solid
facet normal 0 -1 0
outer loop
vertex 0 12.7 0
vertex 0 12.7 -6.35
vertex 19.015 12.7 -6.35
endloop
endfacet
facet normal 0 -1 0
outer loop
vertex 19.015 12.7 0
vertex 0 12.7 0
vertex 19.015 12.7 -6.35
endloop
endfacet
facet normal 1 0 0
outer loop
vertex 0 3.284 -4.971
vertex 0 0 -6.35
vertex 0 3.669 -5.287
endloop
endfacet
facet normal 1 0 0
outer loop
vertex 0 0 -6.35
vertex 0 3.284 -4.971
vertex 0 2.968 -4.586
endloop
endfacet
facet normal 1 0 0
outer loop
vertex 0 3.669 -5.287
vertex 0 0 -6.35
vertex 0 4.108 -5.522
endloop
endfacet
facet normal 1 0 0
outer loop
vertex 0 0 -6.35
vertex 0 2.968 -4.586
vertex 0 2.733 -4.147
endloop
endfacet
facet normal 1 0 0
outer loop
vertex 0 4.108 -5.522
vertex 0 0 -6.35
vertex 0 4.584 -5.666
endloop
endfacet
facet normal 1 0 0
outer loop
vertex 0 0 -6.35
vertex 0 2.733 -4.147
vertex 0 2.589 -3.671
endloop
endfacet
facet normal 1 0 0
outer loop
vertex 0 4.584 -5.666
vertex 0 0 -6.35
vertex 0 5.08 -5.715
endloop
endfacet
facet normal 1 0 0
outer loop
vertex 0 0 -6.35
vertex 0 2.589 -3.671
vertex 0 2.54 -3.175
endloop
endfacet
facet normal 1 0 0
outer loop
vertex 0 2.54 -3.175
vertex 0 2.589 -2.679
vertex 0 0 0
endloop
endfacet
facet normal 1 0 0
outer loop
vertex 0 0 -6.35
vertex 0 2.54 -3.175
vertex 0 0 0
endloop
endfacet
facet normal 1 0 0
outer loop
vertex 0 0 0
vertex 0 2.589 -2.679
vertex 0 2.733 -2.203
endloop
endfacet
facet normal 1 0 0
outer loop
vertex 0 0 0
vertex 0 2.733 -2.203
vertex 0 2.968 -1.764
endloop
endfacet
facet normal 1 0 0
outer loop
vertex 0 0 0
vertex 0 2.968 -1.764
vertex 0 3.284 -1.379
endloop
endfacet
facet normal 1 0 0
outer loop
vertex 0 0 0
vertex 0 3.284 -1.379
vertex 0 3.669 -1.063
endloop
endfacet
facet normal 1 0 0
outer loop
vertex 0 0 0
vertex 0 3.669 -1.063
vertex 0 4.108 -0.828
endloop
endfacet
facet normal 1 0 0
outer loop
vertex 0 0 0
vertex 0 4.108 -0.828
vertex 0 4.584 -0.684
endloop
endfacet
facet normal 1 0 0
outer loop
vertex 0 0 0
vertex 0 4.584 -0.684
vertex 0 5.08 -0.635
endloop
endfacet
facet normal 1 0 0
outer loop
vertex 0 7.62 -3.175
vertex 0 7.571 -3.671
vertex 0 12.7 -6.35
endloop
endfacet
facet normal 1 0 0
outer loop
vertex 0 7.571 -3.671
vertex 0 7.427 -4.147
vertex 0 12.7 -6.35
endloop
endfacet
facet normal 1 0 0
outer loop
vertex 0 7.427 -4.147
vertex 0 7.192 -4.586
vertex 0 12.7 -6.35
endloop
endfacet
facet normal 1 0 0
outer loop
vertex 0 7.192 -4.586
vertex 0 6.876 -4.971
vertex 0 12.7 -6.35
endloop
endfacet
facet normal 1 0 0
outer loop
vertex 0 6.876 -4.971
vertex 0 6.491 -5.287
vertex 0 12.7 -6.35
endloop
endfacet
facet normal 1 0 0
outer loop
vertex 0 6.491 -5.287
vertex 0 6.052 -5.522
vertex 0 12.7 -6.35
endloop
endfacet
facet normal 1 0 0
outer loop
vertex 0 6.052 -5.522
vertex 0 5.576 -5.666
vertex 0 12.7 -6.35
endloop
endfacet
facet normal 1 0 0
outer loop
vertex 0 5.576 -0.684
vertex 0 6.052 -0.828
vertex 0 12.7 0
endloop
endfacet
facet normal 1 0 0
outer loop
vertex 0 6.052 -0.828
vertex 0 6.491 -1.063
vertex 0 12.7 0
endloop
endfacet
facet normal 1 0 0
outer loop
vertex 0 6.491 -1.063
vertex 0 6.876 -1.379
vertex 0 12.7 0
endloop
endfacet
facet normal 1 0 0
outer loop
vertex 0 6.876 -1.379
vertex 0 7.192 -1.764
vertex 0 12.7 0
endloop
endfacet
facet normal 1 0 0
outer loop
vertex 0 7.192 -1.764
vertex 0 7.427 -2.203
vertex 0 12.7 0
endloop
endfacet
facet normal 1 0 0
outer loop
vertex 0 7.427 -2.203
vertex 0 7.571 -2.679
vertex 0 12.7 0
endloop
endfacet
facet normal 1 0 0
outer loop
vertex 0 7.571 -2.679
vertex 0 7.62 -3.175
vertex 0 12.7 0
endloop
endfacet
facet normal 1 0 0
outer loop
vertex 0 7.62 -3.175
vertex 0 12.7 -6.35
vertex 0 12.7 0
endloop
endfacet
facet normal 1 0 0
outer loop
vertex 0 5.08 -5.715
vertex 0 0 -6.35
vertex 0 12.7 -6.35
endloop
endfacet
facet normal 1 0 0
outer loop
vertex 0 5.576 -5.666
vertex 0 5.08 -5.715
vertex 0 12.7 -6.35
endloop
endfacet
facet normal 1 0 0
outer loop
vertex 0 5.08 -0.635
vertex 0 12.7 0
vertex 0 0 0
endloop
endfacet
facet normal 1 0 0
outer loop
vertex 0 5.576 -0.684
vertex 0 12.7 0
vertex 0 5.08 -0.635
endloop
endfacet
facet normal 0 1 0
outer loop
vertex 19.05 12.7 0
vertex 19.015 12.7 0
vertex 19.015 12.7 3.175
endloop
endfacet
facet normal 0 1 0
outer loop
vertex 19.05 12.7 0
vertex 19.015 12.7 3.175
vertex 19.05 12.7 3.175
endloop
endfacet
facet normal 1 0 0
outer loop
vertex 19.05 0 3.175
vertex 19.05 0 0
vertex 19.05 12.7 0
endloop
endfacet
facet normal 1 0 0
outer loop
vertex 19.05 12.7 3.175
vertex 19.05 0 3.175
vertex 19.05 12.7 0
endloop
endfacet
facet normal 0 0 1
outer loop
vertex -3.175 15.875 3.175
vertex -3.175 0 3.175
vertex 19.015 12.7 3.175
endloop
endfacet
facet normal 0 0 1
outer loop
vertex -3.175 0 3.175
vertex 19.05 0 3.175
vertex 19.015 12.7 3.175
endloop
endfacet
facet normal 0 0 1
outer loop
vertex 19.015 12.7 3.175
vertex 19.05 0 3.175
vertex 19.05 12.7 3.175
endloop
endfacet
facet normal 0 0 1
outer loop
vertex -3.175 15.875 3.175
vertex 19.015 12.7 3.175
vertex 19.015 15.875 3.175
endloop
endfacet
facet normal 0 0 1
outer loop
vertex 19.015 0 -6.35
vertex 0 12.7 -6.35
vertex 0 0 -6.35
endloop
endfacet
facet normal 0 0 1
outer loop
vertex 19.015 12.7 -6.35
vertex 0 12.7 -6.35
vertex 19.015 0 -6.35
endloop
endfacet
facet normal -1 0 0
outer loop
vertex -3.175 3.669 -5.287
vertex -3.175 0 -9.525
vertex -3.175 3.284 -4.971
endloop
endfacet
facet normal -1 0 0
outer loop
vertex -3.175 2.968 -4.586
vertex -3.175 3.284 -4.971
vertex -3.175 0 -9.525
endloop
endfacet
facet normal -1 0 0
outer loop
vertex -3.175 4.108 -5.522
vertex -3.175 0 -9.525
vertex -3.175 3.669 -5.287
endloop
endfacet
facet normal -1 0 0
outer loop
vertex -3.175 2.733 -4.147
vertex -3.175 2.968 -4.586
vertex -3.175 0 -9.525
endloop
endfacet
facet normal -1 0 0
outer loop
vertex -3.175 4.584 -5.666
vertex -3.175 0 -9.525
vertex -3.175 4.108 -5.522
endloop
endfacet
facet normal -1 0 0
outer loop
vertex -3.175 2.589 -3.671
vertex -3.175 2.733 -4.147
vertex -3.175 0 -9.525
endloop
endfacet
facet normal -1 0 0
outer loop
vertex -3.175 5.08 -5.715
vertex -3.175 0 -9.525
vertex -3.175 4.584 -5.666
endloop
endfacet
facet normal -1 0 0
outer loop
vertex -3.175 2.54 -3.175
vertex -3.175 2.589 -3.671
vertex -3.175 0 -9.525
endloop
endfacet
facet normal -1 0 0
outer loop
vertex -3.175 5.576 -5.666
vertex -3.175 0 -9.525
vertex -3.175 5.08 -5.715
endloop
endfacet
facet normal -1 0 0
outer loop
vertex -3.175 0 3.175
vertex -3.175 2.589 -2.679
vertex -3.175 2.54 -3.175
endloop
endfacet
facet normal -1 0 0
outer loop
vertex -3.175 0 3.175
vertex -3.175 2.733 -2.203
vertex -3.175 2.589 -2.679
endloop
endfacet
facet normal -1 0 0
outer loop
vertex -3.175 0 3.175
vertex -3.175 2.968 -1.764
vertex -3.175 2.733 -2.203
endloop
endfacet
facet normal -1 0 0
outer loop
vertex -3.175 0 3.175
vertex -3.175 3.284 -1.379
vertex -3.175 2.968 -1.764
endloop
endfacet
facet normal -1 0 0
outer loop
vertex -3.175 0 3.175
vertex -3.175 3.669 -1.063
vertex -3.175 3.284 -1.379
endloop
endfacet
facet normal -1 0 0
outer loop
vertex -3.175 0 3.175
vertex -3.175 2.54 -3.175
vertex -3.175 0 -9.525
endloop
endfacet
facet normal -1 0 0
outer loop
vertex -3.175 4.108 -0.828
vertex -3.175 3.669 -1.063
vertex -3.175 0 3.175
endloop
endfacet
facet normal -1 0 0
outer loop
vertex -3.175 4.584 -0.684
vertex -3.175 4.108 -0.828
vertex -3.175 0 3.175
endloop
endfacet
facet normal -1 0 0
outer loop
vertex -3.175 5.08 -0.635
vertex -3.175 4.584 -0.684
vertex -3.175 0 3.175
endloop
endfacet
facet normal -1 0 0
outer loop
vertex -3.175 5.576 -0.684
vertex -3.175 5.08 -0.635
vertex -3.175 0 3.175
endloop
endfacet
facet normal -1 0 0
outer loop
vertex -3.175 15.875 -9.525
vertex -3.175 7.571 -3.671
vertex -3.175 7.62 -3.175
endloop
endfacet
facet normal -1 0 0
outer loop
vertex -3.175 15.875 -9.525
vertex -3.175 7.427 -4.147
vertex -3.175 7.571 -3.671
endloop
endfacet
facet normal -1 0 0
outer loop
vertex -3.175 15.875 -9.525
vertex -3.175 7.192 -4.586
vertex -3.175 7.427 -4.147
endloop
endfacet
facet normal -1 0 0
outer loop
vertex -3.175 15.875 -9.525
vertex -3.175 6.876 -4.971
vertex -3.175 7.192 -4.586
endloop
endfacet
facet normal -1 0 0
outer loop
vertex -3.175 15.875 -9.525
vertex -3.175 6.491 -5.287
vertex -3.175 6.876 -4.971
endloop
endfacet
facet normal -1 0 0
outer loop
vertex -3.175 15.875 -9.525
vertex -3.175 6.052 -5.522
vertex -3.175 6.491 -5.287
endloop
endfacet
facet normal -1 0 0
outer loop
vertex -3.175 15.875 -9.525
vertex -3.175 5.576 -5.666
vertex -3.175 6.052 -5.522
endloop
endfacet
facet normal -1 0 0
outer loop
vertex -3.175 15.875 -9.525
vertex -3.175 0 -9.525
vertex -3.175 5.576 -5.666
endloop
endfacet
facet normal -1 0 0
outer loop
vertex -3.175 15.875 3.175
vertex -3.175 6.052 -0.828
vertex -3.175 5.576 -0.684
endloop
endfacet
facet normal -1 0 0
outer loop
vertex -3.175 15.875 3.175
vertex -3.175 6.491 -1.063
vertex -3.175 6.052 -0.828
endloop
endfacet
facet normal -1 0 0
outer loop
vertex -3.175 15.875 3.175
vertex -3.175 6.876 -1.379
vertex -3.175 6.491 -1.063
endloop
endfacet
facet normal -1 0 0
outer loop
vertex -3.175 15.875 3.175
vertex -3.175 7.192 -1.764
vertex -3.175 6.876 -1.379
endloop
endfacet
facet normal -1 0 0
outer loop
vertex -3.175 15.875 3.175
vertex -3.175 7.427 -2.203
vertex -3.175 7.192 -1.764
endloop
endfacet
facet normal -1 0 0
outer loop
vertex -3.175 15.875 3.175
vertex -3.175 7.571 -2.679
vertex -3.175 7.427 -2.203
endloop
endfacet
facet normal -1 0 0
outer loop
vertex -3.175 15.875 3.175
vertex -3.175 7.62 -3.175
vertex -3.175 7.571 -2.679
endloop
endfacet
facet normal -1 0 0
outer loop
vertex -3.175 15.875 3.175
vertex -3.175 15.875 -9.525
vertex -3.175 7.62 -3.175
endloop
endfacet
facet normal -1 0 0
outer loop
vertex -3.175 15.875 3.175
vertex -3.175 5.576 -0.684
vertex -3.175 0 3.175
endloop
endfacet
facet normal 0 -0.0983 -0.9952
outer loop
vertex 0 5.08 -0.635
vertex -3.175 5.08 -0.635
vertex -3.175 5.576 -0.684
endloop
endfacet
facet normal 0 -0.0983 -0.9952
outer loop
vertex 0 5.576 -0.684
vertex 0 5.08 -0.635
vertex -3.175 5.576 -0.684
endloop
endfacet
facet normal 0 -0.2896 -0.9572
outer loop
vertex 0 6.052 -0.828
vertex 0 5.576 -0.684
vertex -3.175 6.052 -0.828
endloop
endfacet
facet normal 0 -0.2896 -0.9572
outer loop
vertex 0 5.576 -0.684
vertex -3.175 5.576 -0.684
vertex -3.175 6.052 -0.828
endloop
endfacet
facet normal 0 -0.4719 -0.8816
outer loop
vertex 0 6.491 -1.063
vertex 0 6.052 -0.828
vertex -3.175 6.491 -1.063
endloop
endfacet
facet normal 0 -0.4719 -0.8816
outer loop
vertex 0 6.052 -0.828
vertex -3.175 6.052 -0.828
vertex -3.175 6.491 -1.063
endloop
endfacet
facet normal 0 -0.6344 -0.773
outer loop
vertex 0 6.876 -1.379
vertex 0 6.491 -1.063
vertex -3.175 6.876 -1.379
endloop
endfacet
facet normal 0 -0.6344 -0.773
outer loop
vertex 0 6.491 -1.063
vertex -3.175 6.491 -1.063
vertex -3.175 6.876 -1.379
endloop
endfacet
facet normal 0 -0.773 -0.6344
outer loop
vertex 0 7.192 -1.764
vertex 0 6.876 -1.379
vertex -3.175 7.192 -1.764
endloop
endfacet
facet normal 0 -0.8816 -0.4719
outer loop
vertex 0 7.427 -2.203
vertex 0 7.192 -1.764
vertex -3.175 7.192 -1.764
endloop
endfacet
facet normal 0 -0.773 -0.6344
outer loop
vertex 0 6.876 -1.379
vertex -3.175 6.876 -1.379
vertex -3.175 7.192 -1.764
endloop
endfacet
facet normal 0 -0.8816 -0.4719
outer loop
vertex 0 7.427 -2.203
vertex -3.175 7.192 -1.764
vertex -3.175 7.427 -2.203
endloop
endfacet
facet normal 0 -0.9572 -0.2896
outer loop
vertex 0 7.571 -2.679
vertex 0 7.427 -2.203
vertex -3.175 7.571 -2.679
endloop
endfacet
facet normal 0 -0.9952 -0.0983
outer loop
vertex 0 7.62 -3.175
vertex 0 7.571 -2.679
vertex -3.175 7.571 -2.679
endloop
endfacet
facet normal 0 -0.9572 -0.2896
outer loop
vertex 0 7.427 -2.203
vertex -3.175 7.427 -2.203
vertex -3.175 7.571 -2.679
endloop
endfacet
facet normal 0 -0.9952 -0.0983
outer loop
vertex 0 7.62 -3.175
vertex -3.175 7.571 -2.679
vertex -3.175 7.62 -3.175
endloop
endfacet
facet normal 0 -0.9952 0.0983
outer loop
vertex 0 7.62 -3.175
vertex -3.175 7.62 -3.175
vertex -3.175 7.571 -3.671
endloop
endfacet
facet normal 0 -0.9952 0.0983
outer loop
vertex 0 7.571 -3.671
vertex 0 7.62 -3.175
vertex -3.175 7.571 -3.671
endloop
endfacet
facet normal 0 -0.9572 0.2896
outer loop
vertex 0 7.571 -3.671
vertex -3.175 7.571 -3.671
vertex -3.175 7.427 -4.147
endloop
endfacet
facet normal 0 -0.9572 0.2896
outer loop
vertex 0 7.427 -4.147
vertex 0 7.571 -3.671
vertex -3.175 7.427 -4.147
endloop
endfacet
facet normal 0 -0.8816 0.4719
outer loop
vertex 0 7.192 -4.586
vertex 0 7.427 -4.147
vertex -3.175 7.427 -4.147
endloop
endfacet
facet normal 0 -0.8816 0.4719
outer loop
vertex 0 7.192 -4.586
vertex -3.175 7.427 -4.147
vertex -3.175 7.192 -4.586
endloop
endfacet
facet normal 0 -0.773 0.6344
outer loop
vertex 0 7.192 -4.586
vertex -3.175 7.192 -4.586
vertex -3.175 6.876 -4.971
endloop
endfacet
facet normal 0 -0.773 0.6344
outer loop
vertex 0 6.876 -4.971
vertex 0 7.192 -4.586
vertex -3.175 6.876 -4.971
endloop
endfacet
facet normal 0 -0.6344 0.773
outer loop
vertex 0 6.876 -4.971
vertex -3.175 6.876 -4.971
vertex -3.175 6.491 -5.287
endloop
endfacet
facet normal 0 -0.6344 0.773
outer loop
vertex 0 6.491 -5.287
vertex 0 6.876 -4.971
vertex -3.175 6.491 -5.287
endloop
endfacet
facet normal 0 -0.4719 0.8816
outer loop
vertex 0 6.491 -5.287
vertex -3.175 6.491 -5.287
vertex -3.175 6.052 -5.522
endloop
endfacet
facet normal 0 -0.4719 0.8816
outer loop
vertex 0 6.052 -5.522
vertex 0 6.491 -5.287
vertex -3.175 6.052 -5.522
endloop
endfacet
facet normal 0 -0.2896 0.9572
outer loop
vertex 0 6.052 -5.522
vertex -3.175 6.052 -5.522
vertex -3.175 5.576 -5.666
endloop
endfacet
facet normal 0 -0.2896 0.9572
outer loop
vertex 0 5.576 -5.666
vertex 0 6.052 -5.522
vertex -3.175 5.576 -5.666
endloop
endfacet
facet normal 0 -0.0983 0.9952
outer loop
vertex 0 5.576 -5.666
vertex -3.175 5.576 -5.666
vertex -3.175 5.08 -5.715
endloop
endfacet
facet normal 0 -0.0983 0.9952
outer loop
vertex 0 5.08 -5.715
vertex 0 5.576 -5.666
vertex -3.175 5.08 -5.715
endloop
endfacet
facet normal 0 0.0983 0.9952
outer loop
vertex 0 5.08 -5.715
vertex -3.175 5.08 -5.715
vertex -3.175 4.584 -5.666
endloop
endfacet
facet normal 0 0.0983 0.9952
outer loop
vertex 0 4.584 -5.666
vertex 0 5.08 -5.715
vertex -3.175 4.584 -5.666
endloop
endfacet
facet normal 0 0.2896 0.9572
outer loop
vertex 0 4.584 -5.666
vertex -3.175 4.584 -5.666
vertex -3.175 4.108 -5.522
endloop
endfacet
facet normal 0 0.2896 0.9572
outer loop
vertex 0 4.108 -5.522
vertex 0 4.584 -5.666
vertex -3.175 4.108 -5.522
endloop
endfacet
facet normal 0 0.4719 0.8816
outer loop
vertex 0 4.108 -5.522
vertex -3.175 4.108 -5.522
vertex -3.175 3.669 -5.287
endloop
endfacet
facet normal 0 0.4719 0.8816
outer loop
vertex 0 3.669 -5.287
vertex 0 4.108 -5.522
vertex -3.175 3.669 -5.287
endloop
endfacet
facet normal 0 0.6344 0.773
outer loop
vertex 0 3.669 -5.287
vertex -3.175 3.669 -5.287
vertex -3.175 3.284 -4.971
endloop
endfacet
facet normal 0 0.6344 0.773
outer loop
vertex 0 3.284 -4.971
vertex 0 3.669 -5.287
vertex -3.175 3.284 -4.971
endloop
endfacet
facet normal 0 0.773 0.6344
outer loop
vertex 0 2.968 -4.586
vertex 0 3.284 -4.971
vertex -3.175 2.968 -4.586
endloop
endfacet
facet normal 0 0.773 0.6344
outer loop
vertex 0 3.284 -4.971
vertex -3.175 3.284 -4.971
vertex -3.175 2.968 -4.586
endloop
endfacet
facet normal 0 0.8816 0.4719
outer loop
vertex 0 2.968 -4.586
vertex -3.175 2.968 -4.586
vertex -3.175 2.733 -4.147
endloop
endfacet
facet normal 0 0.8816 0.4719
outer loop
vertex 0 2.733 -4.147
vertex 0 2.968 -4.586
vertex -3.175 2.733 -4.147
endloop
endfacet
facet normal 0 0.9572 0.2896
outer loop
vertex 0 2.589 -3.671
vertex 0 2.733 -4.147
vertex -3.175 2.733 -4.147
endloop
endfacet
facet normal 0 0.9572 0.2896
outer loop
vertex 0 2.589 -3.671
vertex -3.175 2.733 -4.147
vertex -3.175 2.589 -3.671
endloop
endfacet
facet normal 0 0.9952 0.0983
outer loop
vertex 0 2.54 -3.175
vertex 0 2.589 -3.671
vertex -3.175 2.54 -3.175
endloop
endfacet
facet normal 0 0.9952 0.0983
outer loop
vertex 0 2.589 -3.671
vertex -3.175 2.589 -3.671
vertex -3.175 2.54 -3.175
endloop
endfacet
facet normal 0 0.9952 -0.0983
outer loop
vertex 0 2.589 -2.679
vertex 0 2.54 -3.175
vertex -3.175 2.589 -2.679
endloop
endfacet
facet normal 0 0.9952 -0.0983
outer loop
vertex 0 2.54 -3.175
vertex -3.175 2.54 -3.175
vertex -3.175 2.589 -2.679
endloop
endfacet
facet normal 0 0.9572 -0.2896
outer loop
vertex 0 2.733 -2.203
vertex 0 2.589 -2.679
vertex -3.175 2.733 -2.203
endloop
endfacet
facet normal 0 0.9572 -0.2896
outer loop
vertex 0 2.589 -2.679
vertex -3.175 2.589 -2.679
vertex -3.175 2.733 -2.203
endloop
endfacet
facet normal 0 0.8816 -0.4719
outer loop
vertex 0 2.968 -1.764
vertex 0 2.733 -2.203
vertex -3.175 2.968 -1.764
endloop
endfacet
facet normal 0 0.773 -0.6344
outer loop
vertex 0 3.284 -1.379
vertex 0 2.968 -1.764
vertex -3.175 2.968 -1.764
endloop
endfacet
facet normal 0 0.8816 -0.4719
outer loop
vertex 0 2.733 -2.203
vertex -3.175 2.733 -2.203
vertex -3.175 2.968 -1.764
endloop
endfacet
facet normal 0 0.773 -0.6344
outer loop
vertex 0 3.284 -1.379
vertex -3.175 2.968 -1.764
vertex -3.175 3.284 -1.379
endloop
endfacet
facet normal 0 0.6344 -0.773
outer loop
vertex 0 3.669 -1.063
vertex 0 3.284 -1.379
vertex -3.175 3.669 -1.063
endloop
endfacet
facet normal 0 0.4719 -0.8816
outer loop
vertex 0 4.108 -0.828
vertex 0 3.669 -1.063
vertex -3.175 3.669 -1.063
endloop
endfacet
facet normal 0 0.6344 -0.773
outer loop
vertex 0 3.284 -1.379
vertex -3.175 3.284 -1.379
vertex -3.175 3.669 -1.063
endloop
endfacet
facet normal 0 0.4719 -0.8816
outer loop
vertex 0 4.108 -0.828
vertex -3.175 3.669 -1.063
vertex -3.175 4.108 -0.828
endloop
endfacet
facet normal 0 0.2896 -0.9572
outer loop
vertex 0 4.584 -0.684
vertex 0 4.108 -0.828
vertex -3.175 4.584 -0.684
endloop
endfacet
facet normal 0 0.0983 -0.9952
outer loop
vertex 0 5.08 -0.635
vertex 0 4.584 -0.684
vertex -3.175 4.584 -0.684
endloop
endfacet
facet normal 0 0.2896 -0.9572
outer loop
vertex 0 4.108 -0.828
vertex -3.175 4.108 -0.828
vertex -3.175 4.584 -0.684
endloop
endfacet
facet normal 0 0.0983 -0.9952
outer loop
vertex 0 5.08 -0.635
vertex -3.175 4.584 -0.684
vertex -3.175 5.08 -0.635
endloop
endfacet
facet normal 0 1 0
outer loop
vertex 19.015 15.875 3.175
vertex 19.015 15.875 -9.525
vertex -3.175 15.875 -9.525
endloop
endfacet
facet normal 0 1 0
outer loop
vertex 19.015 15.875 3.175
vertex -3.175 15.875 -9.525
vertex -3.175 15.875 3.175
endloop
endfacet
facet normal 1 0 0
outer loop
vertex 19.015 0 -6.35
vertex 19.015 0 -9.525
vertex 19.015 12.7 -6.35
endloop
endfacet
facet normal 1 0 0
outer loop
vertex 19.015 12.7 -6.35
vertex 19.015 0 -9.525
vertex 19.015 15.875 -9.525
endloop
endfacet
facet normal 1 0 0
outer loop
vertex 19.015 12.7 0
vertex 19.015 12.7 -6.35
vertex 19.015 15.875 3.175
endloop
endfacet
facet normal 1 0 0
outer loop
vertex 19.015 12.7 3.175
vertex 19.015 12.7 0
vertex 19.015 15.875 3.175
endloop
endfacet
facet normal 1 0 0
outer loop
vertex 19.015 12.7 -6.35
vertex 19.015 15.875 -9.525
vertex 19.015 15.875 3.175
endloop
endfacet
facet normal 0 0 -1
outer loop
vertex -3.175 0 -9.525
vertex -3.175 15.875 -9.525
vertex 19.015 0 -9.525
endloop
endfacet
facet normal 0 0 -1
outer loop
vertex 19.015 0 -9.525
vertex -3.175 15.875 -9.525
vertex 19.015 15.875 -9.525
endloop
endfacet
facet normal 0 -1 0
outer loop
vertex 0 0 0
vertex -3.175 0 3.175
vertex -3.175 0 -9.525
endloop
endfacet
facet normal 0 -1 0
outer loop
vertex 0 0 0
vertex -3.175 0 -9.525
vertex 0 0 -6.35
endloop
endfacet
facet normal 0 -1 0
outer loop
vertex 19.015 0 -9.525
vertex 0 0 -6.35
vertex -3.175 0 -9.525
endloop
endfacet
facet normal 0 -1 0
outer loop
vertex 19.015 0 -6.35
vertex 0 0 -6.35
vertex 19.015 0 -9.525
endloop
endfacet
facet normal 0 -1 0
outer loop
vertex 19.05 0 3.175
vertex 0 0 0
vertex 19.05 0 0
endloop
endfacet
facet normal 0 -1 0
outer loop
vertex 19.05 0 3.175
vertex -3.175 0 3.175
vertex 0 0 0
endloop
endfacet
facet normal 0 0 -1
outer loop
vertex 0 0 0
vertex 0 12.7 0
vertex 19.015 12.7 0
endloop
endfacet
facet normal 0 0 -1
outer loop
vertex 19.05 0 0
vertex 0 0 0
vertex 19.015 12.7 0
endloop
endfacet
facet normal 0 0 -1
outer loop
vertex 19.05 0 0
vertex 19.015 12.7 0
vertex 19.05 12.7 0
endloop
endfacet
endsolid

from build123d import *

# Parameters (mm, degrees)
SKETCH1_W           = 19.05
SKETCH1_H           = 12.7
BOSS_EXTRUDE1_DEPTH = 3.175
SKETCH3_W           = 19.014556256
SKETCH3_H           = 12.7
BOSS_EXTRUDE2_DEPTH = 3.175
SKETCH5_W           = 12.7
SKETCH5_H           = 15.875
BOSS_EXTRUDE4_DEPTH = 3.175
SKETCH6_R           = 2.54
CUT_EXTRUDE1_DEPTH  = 23.225
SKETCH4_W           = 19.014556256
SKETCH4_H           = 3.175
BOSS_EXTRUDE5_DEPTH = 12.7


with BuildPart() as part:
    # Sketch1 → Boss-Extrude1 (new body)
    with BuildSketch(Plane.XY):
        with Locations((9.525, 6.35)):
            Rectangle(SKETCH1_W, SKETCH1_H)
    extrude(amount=BOSS_EXTRUDE1_DEPTH)

    # Sketch3 → Boss-Extrude2 (add)
    with BuildSketch(Plane(origin=(0, 12.7, 0), x_dir=(1, 0, 0), z_dir=(0, 1, 0))):
        with Locations((9.507278128, 3.175)):
            Rectangle(SKETCH3_W, SKETCH3_H)
    extrude(amount=BOSS_EXTRUDE2_DEPTH)

    # Sketch5 → Boss-Extrude4 (add)
    with BuildSketch(Plane.ZY):
        with Locations((-3.175, 7.9375)):
            Rectangle(SKETCH5_W, SKETCH5_H)
    extrude(amount=BOSS_EXTRUDE4_DEPTH)

    # Sketch6 → Cut-Extrude1 (cut, through all)
    with BuildSketch(Plane.ZY.offset(3.175)):
        with Locations((-3.175, 5.08)):
            Circle(SKETCH6_R)
    extrude(amount=-CUT_EXTRUDE1_DEPTH, mode=Mode.SUBTRACT)

    # Sketch4 → Boss-Extrude5 (add)
    with BuildSketch(Plane.XZ.offset(-12.7)):
        with Locations((9.507278128, -7.9375)):
            Rectangle(SKETCH4_W, SKETCH4_H)
    extrude(amount=BOSS_EXTRUDE5_DEPTH)


solid = part.part
